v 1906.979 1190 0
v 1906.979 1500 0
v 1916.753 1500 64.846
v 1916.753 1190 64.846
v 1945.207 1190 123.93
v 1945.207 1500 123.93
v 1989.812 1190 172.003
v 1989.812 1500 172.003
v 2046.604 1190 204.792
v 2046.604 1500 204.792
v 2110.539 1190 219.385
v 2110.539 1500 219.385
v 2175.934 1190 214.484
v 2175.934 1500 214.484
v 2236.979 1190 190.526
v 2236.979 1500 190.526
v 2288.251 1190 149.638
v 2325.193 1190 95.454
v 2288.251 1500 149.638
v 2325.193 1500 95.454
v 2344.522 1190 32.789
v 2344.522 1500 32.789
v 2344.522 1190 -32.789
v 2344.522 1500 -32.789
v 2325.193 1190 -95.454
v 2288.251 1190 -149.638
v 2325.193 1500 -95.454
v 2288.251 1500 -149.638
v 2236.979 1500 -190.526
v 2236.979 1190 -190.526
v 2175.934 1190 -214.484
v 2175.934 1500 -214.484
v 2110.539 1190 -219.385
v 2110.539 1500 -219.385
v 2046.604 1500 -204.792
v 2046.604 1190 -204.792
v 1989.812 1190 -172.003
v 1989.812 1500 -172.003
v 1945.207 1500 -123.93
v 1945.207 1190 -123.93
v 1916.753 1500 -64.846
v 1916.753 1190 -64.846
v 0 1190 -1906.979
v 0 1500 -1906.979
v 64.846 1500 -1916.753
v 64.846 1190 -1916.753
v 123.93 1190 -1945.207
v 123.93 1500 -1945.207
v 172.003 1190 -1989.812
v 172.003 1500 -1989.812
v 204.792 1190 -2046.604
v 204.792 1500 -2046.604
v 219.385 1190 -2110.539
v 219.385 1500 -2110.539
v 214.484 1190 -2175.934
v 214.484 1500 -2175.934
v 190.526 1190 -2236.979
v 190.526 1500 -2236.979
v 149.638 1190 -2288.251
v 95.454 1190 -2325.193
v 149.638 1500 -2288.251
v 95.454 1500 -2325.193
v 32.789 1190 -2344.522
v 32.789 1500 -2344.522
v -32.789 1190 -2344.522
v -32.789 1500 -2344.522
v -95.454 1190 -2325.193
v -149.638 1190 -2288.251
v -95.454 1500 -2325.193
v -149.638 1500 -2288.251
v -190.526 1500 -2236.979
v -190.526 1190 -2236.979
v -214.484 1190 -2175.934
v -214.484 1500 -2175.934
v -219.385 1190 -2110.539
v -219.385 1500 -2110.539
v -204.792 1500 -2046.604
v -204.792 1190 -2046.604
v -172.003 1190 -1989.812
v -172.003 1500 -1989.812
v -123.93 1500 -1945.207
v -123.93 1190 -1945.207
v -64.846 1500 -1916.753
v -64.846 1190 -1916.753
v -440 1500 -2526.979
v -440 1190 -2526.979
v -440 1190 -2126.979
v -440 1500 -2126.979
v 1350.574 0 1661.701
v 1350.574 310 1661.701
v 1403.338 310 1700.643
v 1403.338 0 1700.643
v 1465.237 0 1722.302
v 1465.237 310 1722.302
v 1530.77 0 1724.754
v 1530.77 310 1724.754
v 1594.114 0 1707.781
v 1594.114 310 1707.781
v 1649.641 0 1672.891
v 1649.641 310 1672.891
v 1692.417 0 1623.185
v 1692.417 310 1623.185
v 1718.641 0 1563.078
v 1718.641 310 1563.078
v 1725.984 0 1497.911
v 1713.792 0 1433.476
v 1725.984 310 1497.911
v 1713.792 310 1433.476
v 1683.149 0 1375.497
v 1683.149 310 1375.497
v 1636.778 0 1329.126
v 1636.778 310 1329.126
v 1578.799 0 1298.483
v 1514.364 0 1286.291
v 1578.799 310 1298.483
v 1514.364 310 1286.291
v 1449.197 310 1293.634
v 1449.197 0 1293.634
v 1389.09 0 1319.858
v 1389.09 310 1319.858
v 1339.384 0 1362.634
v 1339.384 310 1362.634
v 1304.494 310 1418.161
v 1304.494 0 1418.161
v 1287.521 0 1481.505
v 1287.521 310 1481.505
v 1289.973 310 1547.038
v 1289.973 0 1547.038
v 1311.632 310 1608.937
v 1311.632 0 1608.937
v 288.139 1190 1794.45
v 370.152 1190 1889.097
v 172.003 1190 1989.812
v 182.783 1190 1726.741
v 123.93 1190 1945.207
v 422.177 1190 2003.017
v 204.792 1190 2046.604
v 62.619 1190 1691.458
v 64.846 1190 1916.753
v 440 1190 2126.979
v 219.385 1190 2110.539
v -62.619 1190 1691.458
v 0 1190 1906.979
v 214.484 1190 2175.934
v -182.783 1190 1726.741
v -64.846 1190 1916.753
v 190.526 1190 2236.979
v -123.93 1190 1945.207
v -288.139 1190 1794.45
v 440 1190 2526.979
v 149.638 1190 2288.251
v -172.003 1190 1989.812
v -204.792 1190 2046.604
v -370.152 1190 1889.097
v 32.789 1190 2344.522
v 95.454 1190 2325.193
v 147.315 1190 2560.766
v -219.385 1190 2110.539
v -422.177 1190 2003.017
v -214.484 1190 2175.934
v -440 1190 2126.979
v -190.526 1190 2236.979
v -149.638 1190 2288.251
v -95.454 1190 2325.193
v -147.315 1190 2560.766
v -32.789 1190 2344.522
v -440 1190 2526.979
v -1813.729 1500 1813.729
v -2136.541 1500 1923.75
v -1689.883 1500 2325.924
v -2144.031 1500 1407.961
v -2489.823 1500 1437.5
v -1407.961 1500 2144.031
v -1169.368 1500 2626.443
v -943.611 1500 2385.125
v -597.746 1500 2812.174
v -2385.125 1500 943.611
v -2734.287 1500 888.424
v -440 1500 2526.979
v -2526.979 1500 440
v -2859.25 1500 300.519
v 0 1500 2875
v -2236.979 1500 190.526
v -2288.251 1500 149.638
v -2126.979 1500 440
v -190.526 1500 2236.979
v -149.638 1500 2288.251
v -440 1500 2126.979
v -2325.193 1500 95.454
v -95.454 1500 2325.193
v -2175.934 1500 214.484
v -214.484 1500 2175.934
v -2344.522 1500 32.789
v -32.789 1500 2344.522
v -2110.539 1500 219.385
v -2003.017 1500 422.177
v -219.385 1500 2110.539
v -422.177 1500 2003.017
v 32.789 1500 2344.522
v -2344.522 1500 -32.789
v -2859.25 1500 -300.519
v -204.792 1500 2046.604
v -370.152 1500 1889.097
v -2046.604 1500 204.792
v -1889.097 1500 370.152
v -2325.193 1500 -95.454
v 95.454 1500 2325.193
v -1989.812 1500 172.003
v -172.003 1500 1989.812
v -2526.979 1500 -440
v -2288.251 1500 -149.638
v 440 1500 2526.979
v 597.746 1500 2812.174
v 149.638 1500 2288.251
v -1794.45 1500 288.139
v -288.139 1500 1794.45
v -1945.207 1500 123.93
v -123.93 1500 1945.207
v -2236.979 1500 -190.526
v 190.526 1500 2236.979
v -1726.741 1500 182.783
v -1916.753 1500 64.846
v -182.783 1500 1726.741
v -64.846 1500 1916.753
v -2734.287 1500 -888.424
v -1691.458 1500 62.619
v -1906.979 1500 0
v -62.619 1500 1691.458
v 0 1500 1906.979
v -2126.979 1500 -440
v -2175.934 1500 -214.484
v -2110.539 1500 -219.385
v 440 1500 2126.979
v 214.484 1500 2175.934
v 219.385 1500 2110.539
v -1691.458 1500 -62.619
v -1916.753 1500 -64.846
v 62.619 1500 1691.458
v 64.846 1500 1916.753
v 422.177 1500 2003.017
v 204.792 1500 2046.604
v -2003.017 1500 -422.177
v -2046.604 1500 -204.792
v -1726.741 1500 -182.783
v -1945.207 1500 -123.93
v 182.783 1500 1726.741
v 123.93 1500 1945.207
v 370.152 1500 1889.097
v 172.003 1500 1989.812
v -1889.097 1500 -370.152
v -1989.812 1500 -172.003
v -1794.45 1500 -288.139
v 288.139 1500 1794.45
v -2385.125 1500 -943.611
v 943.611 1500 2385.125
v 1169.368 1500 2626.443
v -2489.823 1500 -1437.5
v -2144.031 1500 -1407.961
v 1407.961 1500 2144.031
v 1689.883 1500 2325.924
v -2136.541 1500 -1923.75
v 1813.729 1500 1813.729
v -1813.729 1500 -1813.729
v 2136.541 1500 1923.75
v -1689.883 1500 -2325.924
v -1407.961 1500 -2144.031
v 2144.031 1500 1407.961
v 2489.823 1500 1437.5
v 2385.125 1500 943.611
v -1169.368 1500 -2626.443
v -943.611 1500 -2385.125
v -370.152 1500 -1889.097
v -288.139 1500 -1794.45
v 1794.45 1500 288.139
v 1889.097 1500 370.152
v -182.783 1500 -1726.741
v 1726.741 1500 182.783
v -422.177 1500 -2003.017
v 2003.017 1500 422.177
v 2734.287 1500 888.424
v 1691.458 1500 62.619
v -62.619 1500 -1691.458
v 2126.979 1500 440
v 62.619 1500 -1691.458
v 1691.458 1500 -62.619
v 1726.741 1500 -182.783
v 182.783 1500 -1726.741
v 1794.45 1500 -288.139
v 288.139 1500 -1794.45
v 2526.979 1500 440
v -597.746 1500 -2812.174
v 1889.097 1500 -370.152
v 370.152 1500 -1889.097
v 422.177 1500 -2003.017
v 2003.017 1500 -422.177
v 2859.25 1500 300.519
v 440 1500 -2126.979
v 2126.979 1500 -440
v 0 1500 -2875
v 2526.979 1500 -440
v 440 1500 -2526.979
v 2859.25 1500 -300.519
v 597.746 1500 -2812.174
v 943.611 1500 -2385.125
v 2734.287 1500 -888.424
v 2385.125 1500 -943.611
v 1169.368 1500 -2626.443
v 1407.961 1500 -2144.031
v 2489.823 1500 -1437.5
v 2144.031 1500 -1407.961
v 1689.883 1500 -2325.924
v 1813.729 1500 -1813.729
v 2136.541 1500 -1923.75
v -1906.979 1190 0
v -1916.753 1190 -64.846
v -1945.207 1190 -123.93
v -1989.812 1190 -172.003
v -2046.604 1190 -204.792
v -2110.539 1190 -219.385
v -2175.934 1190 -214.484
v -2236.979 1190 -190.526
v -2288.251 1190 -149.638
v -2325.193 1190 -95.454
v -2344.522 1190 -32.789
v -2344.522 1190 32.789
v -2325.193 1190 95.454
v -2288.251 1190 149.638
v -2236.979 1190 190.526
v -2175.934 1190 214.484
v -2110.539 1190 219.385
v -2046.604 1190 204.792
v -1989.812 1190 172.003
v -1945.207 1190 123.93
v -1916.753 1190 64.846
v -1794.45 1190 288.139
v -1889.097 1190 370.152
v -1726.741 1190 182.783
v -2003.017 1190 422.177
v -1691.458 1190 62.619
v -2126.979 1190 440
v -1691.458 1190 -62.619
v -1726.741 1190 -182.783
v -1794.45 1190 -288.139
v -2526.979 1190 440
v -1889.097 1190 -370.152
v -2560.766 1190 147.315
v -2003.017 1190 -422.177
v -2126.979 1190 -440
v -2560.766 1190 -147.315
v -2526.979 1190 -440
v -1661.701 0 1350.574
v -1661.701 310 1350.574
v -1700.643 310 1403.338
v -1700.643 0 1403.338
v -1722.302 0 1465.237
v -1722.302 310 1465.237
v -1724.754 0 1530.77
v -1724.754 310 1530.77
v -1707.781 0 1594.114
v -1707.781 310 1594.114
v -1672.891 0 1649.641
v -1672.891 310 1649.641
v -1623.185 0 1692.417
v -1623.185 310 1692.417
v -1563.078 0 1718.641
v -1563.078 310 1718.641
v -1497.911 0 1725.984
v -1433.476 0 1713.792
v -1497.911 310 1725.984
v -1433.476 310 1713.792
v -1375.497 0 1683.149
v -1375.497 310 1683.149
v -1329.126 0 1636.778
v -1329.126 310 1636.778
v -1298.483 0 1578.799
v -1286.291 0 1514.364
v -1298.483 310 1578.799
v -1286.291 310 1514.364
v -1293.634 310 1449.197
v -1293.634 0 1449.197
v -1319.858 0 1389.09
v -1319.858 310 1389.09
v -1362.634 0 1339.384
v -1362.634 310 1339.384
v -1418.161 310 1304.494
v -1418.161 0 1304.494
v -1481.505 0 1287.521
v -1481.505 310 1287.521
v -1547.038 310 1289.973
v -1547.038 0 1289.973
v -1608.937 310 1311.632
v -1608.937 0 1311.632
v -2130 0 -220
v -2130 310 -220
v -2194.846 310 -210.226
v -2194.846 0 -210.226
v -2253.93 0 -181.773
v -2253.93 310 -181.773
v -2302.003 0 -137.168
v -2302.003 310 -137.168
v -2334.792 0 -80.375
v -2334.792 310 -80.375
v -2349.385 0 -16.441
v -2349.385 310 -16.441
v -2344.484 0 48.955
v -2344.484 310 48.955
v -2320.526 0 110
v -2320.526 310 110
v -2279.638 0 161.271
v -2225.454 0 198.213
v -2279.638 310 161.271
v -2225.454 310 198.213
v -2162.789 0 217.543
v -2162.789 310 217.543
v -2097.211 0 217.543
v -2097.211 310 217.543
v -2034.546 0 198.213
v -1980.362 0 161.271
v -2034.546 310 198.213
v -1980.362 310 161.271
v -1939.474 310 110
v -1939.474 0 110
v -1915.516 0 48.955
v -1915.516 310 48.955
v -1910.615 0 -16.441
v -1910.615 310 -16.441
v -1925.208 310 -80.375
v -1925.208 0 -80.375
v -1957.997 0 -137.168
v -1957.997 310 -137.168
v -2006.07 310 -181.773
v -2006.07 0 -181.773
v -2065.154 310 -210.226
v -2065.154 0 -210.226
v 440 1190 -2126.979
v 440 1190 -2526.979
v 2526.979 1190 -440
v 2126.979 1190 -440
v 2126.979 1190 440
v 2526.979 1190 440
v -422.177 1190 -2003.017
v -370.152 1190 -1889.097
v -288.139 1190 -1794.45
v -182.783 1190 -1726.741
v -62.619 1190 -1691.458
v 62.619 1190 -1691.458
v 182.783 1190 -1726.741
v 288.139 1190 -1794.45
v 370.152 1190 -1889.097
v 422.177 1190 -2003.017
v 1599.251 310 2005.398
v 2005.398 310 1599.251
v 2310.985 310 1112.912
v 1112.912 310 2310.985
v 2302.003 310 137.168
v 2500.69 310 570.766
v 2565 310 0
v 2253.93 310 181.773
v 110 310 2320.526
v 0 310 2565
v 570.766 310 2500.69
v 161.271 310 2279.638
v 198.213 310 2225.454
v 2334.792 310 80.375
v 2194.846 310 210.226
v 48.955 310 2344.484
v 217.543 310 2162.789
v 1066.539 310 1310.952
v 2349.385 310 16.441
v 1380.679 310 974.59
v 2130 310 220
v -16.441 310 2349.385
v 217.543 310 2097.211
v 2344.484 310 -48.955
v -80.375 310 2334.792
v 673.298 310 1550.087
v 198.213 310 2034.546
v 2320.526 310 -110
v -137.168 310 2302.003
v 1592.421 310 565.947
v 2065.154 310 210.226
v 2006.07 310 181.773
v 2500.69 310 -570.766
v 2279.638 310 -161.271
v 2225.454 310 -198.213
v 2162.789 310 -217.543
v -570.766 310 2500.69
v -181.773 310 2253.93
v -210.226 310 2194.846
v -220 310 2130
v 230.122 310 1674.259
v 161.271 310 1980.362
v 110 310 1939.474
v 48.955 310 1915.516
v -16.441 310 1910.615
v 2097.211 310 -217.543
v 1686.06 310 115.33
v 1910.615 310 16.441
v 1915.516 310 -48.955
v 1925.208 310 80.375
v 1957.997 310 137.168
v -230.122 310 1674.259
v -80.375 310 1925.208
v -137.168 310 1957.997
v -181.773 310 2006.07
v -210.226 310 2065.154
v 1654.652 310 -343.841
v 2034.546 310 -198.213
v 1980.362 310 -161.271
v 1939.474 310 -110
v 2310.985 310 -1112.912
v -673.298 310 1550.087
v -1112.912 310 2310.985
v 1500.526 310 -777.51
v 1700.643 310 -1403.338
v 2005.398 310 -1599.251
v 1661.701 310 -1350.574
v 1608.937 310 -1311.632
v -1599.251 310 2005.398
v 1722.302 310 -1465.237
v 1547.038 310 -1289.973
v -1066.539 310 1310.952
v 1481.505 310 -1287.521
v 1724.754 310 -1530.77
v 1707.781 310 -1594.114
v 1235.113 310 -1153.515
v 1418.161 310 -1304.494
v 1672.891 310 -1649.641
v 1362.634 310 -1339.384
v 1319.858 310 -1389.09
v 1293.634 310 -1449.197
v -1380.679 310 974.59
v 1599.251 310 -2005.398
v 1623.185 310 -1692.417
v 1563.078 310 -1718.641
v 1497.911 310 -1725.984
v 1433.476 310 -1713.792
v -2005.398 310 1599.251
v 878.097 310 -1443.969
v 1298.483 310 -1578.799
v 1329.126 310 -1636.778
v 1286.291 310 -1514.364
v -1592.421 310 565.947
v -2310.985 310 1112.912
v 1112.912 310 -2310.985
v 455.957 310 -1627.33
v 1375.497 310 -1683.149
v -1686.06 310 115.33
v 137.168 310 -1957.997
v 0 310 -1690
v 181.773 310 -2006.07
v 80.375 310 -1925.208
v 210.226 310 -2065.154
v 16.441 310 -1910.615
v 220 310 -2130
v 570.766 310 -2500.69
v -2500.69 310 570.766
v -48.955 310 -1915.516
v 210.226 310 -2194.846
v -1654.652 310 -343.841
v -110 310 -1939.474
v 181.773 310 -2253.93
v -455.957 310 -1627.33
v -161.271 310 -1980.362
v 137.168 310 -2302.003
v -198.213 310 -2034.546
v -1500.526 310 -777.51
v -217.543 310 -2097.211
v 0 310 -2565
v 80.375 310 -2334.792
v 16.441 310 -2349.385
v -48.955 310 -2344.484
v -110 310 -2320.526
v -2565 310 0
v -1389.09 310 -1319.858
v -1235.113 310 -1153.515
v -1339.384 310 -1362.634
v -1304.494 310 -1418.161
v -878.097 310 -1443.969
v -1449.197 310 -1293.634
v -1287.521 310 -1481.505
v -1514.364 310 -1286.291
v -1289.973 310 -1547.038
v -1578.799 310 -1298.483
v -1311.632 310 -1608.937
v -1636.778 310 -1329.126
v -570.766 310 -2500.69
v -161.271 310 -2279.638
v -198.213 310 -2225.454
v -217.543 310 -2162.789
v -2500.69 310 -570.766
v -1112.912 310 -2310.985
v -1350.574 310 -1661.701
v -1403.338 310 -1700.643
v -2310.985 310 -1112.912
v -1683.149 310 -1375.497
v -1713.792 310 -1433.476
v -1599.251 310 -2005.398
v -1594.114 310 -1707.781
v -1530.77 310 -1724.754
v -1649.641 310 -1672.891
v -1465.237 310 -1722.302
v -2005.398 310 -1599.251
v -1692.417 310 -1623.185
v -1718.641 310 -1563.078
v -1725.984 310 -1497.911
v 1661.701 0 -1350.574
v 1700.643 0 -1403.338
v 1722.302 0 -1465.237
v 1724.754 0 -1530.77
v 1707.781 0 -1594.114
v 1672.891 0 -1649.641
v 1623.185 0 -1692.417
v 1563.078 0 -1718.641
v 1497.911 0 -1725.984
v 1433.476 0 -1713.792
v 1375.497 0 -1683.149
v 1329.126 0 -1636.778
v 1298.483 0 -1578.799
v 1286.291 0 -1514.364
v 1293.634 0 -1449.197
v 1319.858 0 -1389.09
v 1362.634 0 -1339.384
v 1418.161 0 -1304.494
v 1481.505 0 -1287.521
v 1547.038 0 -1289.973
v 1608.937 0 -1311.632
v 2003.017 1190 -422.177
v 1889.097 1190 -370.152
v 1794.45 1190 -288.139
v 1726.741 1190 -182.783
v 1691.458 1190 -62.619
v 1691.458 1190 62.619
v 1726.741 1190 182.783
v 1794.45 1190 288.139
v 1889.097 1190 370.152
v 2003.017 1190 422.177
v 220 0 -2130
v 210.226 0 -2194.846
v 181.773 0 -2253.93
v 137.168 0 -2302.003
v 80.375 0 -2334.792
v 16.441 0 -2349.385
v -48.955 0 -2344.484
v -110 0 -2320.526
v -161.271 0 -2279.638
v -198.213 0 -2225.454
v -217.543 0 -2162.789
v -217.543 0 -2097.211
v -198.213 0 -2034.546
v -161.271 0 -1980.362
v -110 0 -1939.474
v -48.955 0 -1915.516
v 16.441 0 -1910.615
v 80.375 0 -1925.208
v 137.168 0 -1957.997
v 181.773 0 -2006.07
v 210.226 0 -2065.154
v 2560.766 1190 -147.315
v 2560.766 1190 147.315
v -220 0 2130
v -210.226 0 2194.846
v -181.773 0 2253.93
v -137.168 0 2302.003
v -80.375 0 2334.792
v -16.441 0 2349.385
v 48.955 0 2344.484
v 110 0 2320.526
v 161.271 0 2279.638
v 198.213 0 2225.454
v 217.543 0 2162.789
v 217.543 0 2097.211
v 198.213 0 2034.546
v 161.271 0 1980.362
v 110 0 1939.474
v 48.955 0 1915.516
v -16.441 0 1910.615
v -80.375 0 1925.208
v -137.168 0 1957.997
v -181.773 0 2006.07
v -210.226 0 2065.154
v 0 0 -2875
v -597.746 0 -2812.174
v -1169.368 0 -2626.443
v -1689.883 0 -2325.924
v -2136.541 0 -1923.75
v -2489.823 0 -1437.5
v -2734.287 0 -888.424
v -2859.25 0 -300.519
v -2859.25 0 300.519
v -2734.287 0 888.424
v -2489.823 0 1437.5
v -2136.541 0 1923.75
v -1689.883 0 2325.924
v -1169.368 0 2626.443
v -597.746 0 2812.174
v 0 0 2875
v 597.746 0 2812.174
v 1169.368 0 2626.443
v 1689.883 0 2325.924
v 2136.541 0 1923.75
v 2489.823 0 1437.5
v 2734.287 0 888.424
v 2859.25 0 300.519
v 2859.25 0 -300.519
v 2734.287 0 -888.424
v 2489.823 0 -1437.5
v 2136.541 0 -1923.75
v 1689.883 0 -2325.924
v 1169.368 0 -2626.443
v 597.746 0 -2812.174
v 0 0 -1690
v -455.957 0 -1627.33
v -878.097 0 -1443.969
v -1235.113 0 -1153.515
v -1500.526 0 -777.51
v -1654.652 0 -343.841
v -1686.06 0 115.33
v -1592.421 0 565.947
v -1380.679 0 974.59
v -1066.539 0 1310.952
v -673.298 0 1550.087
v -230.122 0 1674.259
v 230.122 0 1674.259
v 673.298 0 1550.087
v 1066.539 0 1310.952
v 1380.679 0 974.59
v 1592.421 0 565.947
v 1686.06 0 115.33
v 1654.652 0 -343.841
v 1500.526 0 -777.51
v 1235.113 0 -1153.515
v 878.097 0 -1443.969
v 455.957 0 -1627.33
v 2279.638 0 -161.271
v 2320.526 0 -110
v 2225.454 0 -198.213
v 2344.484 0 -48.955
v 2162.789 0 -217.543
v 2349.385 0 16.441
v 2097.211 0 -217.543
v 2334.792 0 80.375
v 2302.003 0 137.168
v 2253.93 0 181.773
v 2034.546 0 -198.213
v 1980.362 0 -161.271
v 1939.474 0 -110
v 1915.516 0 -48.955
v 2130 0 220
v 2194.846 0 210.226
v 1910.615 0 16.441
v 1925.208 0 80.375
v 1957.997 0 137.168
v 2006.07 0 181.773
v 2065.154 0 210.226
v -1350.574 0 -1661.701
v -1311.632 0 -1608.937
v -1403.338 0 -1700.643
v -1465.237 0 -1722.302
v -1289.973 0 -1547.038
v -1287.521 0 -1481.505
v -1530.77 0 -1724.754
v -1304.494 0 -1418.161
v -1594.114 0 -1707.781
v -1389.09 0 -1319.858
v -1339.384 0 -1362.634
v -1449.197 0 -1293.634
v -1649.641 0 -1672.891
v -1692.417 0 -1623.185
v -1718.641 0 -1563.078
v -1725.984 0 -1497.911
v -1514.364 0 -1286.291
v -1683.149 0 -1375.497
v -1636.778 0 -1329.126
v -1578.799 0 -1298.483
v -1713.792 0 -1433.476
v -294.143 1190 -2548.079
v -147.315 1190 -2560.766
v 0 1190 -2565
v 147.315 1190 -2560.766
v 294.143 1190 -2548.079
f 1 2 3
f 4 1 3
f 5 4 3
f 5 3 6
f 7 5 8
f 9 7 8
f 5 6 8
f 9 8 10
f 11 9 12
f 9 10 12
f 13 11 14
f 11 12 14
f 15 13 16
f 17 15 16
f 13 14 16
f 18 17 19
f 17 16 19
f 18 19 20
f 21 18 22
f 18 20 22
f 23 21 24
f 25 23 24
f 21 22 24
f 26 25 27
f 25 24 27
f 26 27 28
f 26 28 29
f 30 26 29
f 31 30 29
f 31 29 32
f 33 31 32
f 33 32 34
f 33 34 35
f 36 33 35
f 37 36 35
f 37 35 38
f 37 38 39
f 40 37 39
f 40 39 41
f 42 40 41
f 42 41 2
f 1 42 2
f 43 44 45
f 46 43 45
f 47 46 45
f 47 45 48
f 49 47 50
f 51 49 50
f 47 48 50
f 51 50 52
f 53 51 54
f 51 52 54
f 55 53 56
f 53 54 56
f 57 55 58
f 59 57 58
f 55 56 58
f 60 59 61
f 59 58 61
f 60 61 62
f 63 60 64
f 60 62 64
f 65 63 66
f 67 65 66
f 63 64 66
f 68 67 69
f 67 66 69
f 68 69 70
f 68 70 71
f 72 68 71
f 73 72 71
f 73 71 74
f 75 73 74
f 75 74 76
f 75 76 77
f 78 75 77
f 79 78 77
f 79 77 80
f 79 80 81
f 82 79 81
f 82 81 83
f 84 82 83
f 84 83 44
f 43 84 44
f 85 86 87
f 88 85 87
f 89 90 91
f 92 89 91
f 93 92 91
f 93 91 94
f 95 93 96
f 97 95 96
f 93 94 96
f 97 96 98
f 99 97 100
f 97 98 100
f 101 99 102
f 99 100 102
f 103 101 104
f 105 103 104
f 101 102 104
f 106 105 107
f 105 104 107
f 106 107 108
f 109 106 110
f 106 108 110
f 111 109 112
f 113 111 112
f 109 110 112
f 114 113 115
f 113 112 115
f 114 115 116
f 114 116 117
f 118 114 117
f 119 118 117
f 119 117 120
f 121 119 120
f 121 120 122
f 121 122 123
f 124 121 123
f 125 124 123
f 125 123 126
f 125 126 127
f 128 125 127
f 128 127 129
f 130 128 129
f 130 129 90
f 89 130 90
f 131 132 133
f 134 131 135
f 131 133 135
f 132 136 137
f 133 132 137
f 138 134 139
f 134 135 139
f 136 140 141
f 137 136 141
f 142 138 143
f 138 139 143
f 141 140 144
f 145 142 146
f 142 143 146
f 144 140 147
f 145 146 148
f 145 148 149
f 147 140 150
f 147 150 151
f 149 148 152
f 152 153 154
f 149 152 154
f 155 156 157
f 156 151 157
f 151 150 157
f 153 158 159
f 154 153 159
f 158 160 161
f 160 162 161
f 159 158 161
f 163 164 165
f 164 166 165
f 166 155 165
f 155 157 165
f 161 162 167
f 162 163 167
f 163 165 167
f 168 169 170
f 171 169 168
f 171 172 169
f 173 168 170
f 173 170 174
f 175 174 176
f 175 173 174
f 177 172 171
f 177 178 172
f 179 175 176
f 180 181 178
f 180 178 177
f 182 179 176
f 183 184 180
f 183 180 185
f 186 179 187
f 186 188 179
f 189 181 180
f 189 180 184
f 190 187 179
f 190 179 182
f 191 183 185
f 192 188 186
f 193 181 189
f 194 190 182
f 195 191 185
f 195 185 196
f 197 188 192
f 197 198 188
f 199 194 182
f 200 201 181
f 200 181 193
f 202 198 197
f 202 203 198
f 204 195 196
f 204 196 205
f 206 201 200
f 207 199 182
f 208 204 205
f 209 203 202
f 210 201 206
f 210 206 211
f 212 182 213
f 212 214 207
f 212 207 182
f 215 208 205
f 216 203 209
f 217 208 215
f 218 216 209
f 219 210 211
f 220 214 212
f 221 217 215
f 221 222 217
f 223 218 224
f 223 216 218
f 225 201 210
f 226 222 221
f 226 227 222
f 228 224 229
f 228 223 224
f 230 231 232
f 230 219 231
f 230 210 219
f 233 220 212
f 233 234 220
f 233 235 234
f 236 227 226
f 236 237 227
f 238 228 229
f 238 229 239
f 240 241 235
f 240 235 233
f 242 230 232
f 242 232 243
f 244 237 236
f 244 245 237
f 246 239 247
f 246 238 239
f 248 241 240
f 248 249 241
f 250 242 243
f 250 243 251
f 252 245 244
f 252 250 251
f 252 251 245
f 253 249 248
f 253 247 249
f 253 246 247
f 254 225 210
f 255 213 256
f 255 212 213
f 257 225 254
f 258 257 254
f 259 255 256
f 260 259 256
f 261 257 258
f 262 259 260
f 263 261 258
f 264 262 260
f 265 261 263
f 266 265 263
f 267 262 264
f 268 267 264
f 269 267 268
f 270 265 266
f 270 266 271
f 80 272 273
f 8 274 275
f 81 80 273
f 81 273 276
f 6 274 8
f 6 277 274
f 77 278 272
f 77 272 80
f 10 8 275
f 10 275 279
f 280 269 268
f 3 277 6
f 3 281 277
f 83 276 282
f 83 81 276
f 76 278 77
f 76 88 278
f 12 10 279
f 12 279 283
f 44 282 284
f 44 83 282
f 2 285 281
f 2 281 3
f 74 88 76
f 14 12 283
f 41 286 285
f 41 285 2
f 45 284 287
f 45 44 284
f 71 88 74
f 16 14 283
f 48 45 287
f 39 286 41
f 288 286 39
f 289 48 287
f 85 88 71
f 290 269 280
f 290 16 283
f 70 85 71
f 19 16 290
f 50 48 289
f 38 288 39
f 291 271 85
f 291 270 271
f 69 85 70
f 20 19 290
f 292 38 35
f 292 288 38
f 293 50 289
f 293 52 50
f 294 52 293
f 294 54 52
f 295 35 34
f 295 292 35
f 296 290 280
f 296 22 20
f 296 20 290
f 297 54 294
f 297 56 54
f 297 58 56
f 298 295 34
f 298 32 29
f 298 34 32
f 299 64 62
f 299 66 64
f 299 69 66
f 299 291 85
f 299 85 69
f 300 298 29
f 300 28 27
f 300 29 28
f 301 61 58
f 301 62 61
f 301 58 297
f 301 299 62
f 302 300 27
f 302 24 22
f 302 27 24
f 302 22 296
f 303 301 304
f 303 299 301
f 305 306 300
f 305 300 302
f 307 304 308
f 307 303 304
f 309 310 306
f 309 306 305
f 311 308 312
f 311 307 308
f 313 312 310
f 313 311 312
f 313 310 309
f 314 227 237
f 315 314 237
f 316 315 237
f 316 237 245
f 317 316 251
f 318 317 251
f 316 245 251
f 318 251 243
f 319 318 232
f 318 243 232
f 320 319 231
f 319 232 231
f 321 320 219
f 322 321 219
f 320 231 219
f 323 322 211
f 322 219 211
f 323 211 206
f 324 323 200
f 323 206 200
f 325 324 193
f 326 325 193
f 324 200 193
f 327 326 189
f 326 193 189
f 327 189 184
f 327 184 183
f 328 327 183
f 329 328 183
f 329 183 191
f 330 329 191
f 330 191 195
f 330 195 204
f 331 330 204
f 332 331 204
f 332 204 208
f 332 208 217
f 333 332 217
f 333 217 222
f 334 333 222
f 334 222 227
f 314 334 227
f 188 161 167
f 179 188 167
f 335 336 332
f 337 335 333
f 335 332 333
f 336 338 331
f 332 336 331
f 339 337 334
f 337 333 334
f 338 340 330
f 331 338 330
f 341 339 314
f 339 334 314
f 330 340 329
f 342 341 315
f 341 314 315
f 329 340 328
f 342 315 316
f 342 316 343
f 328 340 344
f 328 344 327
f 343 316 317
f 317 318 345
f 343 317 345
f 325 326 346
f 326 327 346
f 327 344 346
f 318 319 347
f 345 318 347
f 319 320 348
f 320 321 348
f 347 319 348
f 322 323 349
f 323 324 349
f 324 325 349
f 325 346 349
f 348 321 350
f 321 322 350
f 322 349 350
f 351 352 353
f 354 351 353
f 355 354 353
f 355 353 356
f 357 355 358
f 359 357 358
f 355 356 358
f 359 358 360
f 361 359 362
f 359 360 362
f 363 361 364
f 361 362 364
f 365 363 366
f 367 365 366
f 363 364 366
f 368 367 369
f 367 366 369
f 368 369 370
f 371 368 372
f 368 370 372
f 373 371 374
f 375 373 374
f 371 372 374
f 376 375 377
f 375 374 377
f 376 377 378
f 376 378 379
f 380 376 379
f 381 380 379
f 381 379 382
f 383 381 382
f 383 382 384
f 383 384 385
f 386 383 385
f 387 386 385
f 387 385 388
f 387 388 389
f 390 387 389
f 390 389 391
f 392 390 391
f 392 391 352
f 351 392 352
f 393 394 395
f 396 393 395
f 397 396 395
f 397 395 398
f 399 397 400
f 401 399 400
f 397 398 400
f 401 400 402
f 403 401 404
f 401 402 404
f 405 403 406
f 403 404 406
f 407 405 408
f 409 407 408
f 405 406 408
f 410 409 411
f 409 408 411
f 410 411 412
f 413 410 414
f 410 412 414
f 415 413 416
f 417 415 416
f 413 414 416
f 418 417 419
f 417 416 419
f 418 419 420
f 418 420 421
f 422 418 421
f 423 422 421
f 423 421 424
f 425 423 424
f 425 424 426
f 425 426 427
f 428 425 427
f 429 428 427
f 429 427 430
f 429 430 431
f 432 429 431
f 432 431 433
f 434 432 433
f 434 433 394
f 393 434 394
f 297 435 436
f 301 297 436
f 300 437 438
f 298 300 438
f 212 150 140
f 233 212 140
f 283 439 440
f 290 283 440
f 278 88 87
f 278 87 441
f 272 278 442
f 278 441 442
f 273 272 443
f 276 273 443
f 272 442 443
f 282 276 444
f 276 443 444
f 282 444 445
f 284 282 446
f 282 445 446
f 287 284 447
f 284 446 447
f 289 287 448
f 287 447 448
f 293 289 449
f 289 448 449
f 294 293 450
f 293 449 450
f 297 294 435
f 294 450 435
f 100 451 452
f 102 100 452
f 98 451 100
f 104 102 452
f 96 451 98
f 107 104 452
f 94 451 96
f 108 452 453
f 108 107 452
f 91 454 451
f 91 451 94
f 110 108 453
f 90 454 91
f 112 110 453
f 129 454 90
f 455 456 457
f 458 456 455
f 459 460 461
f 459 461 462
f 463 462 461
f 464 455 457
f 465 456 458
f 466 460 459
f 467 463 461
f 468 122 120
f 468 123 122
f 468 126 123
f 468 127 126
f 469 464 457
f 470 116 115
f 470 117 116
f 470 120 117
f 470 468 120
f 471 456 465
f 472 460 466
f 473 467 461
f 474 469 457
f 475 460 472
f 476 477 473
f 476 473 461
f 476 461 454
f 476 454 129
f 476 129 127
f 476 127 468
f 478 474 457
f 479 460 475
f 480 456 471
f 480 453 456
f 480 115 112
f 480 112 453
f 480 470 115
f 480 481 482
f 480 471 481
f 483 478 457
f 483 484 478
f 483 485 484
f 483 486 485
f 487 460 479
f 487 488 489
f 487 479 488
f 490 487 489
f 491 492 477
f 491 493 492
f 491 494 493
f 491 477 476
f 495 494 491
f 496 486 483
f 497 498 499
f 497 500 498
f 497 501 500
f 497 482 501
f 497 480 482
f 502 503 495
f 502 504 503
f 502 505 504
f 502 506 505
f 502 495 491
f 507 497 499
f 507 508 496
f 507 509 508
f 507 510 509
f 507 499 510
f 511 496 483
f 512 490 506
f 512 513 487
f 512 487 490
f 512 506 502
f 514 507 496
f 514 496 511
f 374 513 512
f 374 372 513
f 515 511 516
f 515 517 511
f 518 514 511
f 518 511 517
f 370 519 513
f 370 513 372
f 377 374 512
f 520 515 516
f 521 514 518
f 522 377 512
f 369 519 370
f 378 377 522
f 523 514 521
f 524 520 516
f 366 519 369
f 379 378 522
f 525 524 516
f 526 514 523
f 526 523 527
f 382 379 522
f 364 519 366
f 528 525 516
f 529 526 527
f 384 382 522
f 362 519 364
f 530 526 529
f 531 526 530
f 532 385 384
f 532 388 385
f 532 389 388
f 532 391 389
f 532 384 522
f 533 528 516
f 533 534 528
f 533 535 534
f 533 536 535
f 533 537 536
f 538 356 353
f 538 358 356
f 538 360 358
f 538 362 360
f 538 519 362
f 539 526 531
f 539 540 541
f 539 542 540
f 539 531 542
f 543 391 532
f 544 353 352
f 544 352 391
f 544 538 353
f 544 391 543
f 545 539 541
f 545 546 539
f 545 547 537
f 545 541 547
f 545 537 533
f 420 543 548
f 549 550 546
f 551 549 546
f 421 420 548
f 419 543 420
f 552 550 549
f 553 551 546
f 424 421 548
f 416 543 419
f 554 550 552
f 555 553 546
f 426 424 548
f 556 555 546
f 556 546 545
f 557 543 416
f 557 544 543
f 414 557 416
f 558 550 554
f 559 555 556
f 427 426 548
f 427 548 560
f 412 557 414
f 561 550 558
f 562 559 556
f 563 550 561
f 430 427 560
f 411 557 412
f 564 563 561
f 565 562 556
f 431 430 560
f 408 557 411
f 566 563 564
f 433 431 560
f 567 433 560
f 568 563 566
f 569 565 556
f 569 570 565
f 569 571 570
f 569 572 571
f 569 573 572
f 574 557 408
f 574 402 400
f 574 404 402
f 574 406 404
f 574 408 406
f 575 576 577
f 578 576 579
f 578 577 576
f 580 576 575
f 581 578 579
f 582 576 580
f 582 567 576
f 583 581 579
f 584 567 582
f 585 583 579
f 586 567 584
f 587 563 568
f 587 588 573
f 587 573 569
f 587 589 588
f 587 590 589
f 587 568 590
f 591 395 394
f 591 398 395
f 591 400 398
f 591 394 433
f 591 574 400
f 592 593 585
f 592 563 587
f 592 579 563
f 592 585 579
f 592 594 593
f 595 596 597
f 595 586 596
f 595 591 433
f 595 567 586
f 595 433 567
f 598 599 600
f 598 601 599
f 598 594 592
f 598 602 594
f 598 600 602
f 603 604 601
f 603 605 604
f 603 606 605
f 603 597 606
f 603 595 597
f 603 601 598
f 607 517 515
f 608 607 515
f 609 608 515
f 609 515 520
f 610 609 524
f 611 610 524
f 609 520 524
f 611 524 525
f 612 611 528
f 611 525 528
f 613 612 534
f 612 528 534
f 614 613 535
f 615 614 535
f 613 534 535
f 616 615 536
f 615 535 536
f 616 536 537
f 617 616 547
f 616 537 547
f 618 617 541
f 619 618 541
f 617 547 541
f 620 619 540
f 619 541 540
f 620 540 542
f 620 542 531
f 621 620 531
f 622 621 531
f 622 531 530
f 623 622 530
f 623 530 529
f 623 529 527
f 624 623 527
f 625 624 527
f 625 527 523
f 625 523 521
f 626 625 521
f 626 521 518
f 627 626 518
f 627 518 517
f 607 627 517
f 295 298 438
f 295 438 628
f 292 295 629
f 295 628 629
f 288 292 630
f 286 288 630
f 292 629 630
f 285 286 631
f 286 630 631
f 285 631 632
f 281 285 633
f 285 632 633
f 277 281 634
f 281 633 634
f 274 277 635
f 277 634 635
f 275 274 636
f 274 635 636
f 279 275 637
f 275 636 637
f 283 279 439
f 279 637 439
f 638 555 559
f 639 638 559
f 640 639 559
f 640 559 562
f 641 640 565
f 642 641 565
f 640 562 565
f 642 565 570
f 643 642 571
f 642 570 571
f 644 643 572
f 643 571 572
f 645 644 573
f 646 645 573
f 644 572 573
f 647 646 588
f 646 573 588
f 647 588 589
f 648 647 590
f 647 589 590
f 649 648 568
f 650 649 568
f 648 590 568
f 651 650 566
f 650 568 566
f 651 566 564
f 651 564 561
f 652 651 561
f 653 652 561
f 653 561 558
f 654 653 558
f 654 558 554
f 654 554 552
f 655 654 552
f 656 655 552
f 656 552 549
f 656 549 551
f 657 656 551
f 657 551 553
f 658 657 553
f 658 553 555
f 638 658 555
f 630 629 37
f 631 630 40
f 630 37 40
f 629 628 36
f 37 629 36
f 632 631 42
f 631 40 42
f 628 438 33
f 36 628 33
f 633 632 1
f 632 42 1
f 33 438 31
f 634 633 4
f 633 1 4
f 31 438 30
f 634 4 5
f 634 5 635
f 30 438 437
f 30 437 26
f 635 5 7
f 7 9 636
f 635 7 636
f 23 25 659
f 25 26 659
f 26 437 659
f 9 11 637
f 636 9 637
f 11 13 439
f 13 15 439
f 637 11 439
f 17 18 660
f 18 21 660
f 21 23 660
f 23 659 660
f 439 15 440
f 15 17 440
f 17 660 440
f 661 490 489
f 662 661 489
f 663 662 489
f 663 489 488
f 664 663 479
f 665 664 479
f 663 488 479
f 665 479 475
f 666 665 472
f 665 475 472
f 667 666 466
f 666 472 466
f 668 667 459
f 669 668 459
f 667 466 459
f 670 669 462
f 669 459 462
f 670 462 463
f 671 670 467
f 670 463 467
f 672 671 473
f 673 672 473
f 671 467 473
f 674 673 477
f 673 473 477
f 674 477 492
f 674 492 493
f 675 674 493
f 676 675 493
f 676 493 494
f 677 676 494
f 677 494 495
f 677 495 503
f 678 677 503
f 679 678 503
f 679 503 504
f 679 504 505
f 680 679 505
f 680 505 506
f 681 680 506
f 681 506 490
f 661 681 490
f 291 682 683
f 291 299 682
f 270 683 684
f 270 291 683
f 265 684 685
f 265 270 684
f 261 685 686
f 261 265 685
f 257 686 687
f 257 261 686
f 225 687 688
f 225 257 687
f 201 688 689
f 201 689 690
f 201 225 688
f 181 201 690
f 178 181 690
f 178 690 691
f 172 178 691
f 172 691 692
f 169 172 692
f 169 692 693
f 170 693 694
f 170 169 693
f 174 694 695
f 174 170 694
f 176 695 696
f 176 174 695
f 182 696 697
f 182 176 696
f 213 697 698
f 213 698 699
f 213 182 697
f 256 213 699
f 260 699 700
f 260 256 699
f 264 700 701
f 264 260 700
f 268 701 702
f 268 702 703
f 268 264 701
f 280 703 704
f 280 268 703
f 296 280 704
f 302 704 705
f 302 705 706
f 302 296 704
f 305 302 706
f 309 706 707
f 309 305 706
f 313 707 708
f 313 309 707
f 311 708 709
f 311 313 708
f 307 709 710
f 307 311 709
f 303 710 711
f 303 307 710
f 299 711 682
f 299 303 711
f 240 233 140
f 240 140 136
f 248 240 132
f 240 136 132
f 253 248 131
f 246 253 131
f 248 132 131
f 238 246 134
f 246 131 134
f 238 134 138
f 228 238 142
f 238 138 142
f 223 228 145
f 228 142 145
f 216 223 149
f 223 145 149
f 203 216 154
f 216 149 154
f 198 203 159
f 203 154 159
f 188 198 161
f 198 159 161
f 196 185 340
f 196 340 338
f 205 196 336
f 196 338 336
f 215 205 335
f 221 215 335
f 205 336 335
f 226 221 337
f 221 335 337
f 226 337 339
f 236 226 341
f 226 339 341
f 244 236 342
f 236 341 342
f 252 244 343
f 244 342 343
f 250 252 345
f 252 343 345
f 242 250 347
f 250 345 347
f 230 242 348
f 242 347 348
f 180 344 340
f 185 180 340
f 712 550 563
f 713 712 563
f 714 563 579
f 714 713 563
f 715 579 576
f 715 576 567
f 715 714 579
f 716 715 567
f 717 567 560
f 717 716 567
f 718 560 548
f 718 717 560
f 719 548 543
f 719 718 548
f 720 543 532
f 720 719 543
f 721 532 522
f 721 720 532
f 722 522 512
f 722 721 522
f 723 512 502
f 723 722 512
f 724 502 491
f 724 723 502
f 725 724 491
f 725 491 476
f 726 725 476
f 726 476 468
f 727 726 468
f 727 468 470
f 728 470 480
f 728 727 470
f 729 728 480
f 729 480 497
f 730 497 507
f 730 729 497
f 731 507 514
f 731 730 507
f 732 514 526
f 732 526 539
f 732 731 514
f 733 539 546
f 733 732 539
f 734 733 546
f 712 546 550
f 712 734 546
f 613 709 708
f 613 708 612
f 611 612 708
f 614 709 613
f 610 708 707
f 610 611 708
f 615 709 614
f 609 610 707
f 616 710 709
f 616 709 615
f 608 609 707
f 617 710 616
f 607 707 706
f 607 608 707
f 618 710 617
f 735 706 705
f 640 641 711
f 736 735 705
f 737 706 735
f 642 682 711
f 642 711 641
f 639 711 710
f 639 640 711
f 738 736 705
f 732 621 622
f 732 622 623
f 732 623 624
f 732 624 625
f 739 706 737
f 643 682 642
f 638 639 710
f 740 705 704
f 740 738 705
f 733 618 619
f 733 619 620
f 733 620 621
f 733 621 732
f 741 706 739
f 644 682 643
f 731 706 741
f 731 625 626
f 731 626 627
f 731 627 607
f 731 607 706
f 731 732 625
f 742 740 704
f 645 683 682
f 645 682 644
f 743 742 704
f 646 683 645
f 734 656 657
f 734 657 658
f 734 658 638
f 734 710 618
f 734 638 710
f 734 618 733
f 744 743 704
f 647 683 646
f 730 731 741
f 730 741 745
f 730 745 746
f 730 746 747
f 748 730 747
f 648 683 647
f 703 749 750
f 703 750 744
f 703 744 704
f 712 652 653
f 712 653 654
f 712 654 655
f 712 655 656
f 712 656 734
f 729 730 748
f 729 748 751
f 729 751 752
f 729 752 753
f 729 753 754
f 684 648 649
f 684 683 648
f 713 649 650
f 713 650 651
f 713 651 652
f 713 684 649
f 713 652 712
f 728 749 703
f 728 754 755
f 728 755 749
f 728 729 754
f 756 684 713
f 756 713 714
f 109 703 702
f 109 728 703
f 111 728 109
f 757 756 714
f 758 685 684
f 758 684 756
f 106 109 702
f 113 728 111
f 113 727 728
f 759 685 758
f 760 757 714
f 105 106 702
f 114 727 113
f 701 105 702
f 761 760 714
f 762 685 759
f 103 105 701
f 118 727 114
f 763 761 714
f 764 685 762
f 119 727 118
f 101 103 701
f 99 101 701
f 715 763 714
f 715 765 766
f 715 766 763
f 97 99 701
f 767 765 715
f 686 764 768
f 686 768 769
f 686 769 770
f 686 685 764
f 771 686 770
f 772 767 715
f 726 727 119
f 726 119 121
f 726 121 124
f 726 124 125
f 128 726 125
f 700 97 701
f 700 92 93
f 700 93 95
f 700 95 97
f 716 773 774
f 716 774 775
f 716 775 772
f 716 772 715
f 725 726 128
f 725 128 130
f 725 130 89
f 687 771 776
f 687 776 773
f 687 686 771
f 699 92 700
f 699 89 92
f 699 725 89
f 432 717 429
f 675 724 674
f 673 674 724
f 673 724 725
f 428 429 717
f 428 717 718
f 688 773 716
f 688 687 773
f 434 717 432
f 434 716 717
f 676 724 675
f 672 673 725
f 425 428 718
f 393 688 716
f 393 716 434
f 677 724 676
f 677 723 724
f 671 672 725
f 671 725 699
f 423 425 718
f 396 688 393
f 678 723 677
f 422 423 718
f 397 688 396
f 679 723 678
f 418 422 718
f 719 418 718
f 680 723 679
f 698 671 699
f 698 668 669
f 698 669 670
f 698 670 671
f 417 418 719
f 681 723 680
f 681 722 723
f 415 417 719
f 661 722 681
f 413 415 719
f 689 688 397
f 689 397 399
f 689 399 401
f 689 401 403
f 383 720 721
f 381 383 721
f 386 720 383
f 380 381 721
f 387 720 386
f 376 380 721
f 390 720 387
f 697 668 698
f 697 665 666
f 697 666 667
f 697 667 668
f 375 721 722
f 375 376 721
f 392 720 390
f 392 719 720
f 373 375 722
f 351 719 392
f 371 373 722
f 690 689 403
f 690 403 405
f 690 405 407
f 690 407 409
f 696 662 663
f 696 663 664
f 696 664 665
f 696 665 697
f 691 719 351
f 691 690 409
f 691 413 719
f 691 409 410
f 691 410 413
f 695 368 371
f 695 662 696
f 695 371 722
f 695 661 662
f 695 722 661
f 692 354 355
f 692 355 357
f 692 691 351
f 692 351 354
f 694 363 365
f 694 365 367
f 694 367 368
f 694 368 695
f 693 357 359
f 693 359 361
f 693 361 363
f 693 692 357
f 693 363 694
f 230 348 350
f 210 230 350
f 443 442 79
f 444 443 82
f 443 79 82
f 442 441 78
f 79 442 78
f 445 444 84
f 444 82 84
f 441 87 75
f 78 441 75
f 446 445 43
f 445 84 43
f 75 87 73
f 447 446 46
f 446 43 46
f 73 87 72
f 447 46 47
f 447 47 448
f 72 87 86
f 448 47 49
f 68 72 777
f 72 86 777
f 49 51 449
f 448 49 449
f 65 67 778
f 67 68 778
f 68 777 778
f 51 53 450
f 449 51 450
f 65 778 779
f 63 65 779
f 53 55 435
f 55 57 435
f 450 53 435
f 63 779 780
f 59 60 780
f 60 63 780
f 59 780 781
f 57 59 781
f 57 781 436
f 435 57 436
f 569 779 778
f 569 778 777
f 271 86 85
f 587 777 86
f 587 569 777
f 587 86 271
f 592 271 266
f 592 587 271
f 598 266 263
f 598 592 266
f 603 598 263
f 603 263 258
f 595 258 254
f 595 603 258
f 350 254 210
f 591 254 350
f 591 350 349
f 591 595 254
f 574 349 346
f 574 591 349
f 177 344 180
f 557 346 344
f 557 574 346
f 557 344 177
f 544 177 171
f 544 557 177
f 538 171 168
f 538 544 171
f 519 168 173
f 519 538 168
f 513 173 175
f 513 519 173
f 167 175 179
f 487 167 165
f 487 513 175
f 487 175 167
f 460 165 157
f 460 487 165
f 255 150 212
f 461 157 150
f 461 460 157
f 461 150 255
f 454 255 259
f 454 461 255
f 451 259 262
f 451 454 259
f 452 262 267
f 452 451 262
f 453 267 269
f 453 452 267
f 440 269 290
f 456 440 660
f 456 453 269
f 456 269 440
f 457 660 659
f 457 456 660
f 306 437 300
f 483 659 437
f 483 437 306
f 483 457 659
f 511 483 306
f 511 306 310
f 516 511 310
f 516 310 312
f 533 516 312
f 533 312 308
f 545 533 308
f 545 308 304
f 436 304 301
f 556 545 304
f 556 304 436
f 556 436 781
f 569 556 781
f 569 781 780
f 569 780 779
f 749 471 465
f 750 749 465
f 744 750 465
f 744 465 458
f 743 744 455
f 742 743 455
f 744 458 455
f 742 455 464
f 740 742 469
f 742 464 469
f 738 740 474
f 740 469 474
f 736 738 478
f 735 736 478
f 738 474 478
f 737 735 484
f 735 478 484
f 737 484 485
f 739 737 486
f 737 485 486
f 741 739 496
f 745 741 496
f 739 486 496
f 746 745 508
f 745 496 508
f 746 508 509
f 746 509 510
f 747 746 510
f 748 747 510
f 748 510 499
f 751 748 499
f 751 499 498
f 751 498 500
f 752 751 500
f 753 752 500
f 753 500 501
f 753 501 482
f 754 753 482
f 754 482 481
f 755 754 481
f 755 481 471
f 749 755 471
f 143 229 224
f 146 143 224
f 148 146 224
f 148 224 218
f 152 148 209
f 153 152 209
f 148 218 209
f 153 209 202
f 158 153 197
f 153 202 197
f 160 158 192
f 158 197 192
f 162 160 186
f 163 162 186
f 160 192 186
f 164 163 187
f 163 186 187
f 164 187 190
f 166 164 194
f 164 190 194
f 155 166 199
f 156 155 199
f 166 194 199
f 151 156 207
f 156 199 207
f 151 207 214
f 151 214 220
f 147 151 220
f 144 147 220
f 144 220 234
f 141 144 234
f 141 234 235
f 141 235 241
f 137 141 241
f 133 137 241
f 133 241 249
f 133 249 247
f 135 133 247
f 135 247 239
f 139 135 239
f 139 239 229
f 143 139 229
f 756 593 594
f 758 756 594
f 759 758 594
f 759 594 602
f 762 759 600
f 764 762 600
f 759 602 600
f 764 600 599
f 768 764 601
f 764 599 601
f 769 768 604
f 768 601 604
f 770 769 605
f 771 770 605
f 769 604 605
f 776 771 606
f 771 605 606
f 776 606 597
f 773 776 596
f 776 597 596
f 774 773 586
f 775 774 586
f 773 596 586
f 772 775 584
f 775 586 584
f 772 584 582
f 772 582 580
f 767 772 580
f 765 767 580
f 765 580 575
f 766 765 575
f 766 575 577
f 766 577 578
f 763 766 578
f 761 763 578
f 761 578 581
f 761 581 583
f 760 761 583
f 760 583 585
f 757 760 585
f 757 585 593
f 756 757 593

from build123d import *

# Parameters (mm, degrees)
SKETCH2_R           = 220
CUT_EXTRUDE1_DEPTH  = 4237.431281161
CIRPATTERN1_COUNT   = 8
BOSS_EXTRUDE1_START = -310
BOSS_EXTRUDE1_DEPTH = 310
CUT_EXTRUDE2_REACH  = 4335.734
SKETCH9_R           = 220
CIRPATTERN2_COUNT   = 4


with BuildPart() as part:
    # Sketch1 → Revolve1 (revolve)
    with BuildSketch(Plane.XY, mode=Mode.PRIVATE) as revolve1_sk:
        Polygon((1690, 0), (2875, 0), (2875, 1500), (2565, 1500), (2565, 310), (1690, 310), align=None)
    revolve(revolve1_sk.sketch.rotate(Axis((0, 0, 0), (0, 1, 0)), 90), axis=Axis((0, 0, 0), (0, 1, 0)))

    # Sketch2 → Cut-Extrude1 (cut, through all)
    with BuildSketch(Plane(origin=(0, 310, 0), x_dir=(1, 0, 0), z_dir=(0, 1, 0))):
        with Locations(Location((2130, 0, 0), (0, 0, 270))):
            Circle(SKETCH2_R)
    cut_extrude1 = extrude(amount=-CUT_EXTRUDE1_DEPTH, mode=Mode.SUBTRACT)

    # CirPattern1: Cut-Extrude1 ×8 about axis
    cirpattern1_axis = Axis((0, 0, 0), (0, 1, 0))
    for i in range(1, CIRPATTERN1_COUNT):
        add(cut_extrude1.rotate(cirpattern1_axis, i * 360 / CIRPATTERN1_COUNT), mode=Mode.SUBTRACT)

    # Sketch8 → Boss-Extrude1 (add)
    with BuildSketch(Plane(origin=(0, 1500, 0), x_dir=(1, 0, 0), z_dir=(0, 1, 0)).offset(BOSS_EXTRUDE1_START)):
        with BuildLine():
            Line((-440, 2526.979422156), (-440, 2126.979422156))
            ThreePointArc((-440, 2126.979422156), (0, 1686.979422156), (440, 2126.979422156))
            Line((440, 2126.979422156), (440, 2526.979422156))
            ThreePointArc((440, 2526.979422156), (0, 2565), (-440, 2526.979422156))
        make_face()
    boss_extrude1 = extrude(amount=BOSS_EXTRUDE1_DEPTH)

    # Sketch9 → Cut-Extrude2 (cut, up to next)
    with BuildSketch(Plane(origin=(0, 1500, 0), x_dir=(1, 0, 0), z_dir=(0, 1, 0)), mode=Mode.PRIVATE) as cut_extrude2_sk1:
        with Locations(Location((0, 2126.979422156, 0), (0, 0, 270))):
            Circle(SKETCH9_R)
    cut_extrude2_tool1 = extrude(cut_extrude2_sk1.sketch, amount=-CUT_EXTRUDE2_REACH, mode=Mode.PRIVATE) & part.part
    cut_extrude2 = cut_extrude2_tool1.solids().sort_by_distance((0, 1500, -2126.979422))[0]
    add(cut_extrude2, mode=Mode.SUBTRACT)

    # CirPattern2: Boss-Extrude1, Cut-Extrude2 ×4 about axis
    cirpattern2_axis = Axis((0, 0, 0), (0, 1, 0))
    add([boss_extrude1.rotate(cirpattern2_axis, i * 360 / CIRPATTERN2_COUNT) for i in range(1, CIRPATTERN2_COUNT)])
    add([cut_extrude2.rotate(cirpattern2_axis, i * 360 / CIRPATTERN2_COUNT) for i in range(1, CIRPATTERN2_COUNT)], mode=Mode.SUBTRACT)


solid = part.part
